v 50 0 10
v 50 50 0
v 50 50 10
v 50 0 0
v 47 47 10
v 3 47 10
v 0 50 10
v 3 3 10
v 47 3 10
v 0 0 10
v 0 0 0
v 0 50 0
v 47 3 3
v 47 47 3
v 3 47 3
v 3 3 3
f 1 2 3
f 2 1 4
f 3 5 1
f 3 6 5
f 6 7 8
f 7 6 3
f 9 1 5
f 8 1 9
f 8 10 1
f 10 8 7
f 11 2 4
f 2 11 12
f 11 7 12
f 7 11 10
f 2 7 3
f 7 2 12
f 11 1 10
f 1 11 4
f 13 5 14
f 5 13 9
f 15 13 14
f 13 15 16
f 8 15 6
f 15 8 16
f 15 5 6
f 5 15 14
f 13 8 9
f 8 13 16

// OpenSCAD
// Generated by HEIDI for job job_1787718663306_8411fcea
// Product: 3D-Printable Model Preparation Package
// Request: E2E production path qualification test — automated cleanup expected
// Model type: box
// Generated: 2026-09-07T04:35:14.701Z
//
// This is a parameterized OpenSCAD model. You can adjust the
// parameters below to customize the dimensions before rendering.

// ─── Parameters ───
width = 50;       // X dimension in mm
height = 50;     // Y dimension in mm
depth = 10;       // Z dimension in mm
wall = 3;    // wall thickness in mm
$fn = 60;               // facet resolution

// Parametric hollow box
module parametric_box() {
    difference() {
        // Outer shell
        cube([width, height, depth]);
        // Inner cavity
        translate([wall, wall, wall])
            cube([width - wall * 2, height - wall * 2, depth - wall + 1]);
    }
}
parametric_box();
